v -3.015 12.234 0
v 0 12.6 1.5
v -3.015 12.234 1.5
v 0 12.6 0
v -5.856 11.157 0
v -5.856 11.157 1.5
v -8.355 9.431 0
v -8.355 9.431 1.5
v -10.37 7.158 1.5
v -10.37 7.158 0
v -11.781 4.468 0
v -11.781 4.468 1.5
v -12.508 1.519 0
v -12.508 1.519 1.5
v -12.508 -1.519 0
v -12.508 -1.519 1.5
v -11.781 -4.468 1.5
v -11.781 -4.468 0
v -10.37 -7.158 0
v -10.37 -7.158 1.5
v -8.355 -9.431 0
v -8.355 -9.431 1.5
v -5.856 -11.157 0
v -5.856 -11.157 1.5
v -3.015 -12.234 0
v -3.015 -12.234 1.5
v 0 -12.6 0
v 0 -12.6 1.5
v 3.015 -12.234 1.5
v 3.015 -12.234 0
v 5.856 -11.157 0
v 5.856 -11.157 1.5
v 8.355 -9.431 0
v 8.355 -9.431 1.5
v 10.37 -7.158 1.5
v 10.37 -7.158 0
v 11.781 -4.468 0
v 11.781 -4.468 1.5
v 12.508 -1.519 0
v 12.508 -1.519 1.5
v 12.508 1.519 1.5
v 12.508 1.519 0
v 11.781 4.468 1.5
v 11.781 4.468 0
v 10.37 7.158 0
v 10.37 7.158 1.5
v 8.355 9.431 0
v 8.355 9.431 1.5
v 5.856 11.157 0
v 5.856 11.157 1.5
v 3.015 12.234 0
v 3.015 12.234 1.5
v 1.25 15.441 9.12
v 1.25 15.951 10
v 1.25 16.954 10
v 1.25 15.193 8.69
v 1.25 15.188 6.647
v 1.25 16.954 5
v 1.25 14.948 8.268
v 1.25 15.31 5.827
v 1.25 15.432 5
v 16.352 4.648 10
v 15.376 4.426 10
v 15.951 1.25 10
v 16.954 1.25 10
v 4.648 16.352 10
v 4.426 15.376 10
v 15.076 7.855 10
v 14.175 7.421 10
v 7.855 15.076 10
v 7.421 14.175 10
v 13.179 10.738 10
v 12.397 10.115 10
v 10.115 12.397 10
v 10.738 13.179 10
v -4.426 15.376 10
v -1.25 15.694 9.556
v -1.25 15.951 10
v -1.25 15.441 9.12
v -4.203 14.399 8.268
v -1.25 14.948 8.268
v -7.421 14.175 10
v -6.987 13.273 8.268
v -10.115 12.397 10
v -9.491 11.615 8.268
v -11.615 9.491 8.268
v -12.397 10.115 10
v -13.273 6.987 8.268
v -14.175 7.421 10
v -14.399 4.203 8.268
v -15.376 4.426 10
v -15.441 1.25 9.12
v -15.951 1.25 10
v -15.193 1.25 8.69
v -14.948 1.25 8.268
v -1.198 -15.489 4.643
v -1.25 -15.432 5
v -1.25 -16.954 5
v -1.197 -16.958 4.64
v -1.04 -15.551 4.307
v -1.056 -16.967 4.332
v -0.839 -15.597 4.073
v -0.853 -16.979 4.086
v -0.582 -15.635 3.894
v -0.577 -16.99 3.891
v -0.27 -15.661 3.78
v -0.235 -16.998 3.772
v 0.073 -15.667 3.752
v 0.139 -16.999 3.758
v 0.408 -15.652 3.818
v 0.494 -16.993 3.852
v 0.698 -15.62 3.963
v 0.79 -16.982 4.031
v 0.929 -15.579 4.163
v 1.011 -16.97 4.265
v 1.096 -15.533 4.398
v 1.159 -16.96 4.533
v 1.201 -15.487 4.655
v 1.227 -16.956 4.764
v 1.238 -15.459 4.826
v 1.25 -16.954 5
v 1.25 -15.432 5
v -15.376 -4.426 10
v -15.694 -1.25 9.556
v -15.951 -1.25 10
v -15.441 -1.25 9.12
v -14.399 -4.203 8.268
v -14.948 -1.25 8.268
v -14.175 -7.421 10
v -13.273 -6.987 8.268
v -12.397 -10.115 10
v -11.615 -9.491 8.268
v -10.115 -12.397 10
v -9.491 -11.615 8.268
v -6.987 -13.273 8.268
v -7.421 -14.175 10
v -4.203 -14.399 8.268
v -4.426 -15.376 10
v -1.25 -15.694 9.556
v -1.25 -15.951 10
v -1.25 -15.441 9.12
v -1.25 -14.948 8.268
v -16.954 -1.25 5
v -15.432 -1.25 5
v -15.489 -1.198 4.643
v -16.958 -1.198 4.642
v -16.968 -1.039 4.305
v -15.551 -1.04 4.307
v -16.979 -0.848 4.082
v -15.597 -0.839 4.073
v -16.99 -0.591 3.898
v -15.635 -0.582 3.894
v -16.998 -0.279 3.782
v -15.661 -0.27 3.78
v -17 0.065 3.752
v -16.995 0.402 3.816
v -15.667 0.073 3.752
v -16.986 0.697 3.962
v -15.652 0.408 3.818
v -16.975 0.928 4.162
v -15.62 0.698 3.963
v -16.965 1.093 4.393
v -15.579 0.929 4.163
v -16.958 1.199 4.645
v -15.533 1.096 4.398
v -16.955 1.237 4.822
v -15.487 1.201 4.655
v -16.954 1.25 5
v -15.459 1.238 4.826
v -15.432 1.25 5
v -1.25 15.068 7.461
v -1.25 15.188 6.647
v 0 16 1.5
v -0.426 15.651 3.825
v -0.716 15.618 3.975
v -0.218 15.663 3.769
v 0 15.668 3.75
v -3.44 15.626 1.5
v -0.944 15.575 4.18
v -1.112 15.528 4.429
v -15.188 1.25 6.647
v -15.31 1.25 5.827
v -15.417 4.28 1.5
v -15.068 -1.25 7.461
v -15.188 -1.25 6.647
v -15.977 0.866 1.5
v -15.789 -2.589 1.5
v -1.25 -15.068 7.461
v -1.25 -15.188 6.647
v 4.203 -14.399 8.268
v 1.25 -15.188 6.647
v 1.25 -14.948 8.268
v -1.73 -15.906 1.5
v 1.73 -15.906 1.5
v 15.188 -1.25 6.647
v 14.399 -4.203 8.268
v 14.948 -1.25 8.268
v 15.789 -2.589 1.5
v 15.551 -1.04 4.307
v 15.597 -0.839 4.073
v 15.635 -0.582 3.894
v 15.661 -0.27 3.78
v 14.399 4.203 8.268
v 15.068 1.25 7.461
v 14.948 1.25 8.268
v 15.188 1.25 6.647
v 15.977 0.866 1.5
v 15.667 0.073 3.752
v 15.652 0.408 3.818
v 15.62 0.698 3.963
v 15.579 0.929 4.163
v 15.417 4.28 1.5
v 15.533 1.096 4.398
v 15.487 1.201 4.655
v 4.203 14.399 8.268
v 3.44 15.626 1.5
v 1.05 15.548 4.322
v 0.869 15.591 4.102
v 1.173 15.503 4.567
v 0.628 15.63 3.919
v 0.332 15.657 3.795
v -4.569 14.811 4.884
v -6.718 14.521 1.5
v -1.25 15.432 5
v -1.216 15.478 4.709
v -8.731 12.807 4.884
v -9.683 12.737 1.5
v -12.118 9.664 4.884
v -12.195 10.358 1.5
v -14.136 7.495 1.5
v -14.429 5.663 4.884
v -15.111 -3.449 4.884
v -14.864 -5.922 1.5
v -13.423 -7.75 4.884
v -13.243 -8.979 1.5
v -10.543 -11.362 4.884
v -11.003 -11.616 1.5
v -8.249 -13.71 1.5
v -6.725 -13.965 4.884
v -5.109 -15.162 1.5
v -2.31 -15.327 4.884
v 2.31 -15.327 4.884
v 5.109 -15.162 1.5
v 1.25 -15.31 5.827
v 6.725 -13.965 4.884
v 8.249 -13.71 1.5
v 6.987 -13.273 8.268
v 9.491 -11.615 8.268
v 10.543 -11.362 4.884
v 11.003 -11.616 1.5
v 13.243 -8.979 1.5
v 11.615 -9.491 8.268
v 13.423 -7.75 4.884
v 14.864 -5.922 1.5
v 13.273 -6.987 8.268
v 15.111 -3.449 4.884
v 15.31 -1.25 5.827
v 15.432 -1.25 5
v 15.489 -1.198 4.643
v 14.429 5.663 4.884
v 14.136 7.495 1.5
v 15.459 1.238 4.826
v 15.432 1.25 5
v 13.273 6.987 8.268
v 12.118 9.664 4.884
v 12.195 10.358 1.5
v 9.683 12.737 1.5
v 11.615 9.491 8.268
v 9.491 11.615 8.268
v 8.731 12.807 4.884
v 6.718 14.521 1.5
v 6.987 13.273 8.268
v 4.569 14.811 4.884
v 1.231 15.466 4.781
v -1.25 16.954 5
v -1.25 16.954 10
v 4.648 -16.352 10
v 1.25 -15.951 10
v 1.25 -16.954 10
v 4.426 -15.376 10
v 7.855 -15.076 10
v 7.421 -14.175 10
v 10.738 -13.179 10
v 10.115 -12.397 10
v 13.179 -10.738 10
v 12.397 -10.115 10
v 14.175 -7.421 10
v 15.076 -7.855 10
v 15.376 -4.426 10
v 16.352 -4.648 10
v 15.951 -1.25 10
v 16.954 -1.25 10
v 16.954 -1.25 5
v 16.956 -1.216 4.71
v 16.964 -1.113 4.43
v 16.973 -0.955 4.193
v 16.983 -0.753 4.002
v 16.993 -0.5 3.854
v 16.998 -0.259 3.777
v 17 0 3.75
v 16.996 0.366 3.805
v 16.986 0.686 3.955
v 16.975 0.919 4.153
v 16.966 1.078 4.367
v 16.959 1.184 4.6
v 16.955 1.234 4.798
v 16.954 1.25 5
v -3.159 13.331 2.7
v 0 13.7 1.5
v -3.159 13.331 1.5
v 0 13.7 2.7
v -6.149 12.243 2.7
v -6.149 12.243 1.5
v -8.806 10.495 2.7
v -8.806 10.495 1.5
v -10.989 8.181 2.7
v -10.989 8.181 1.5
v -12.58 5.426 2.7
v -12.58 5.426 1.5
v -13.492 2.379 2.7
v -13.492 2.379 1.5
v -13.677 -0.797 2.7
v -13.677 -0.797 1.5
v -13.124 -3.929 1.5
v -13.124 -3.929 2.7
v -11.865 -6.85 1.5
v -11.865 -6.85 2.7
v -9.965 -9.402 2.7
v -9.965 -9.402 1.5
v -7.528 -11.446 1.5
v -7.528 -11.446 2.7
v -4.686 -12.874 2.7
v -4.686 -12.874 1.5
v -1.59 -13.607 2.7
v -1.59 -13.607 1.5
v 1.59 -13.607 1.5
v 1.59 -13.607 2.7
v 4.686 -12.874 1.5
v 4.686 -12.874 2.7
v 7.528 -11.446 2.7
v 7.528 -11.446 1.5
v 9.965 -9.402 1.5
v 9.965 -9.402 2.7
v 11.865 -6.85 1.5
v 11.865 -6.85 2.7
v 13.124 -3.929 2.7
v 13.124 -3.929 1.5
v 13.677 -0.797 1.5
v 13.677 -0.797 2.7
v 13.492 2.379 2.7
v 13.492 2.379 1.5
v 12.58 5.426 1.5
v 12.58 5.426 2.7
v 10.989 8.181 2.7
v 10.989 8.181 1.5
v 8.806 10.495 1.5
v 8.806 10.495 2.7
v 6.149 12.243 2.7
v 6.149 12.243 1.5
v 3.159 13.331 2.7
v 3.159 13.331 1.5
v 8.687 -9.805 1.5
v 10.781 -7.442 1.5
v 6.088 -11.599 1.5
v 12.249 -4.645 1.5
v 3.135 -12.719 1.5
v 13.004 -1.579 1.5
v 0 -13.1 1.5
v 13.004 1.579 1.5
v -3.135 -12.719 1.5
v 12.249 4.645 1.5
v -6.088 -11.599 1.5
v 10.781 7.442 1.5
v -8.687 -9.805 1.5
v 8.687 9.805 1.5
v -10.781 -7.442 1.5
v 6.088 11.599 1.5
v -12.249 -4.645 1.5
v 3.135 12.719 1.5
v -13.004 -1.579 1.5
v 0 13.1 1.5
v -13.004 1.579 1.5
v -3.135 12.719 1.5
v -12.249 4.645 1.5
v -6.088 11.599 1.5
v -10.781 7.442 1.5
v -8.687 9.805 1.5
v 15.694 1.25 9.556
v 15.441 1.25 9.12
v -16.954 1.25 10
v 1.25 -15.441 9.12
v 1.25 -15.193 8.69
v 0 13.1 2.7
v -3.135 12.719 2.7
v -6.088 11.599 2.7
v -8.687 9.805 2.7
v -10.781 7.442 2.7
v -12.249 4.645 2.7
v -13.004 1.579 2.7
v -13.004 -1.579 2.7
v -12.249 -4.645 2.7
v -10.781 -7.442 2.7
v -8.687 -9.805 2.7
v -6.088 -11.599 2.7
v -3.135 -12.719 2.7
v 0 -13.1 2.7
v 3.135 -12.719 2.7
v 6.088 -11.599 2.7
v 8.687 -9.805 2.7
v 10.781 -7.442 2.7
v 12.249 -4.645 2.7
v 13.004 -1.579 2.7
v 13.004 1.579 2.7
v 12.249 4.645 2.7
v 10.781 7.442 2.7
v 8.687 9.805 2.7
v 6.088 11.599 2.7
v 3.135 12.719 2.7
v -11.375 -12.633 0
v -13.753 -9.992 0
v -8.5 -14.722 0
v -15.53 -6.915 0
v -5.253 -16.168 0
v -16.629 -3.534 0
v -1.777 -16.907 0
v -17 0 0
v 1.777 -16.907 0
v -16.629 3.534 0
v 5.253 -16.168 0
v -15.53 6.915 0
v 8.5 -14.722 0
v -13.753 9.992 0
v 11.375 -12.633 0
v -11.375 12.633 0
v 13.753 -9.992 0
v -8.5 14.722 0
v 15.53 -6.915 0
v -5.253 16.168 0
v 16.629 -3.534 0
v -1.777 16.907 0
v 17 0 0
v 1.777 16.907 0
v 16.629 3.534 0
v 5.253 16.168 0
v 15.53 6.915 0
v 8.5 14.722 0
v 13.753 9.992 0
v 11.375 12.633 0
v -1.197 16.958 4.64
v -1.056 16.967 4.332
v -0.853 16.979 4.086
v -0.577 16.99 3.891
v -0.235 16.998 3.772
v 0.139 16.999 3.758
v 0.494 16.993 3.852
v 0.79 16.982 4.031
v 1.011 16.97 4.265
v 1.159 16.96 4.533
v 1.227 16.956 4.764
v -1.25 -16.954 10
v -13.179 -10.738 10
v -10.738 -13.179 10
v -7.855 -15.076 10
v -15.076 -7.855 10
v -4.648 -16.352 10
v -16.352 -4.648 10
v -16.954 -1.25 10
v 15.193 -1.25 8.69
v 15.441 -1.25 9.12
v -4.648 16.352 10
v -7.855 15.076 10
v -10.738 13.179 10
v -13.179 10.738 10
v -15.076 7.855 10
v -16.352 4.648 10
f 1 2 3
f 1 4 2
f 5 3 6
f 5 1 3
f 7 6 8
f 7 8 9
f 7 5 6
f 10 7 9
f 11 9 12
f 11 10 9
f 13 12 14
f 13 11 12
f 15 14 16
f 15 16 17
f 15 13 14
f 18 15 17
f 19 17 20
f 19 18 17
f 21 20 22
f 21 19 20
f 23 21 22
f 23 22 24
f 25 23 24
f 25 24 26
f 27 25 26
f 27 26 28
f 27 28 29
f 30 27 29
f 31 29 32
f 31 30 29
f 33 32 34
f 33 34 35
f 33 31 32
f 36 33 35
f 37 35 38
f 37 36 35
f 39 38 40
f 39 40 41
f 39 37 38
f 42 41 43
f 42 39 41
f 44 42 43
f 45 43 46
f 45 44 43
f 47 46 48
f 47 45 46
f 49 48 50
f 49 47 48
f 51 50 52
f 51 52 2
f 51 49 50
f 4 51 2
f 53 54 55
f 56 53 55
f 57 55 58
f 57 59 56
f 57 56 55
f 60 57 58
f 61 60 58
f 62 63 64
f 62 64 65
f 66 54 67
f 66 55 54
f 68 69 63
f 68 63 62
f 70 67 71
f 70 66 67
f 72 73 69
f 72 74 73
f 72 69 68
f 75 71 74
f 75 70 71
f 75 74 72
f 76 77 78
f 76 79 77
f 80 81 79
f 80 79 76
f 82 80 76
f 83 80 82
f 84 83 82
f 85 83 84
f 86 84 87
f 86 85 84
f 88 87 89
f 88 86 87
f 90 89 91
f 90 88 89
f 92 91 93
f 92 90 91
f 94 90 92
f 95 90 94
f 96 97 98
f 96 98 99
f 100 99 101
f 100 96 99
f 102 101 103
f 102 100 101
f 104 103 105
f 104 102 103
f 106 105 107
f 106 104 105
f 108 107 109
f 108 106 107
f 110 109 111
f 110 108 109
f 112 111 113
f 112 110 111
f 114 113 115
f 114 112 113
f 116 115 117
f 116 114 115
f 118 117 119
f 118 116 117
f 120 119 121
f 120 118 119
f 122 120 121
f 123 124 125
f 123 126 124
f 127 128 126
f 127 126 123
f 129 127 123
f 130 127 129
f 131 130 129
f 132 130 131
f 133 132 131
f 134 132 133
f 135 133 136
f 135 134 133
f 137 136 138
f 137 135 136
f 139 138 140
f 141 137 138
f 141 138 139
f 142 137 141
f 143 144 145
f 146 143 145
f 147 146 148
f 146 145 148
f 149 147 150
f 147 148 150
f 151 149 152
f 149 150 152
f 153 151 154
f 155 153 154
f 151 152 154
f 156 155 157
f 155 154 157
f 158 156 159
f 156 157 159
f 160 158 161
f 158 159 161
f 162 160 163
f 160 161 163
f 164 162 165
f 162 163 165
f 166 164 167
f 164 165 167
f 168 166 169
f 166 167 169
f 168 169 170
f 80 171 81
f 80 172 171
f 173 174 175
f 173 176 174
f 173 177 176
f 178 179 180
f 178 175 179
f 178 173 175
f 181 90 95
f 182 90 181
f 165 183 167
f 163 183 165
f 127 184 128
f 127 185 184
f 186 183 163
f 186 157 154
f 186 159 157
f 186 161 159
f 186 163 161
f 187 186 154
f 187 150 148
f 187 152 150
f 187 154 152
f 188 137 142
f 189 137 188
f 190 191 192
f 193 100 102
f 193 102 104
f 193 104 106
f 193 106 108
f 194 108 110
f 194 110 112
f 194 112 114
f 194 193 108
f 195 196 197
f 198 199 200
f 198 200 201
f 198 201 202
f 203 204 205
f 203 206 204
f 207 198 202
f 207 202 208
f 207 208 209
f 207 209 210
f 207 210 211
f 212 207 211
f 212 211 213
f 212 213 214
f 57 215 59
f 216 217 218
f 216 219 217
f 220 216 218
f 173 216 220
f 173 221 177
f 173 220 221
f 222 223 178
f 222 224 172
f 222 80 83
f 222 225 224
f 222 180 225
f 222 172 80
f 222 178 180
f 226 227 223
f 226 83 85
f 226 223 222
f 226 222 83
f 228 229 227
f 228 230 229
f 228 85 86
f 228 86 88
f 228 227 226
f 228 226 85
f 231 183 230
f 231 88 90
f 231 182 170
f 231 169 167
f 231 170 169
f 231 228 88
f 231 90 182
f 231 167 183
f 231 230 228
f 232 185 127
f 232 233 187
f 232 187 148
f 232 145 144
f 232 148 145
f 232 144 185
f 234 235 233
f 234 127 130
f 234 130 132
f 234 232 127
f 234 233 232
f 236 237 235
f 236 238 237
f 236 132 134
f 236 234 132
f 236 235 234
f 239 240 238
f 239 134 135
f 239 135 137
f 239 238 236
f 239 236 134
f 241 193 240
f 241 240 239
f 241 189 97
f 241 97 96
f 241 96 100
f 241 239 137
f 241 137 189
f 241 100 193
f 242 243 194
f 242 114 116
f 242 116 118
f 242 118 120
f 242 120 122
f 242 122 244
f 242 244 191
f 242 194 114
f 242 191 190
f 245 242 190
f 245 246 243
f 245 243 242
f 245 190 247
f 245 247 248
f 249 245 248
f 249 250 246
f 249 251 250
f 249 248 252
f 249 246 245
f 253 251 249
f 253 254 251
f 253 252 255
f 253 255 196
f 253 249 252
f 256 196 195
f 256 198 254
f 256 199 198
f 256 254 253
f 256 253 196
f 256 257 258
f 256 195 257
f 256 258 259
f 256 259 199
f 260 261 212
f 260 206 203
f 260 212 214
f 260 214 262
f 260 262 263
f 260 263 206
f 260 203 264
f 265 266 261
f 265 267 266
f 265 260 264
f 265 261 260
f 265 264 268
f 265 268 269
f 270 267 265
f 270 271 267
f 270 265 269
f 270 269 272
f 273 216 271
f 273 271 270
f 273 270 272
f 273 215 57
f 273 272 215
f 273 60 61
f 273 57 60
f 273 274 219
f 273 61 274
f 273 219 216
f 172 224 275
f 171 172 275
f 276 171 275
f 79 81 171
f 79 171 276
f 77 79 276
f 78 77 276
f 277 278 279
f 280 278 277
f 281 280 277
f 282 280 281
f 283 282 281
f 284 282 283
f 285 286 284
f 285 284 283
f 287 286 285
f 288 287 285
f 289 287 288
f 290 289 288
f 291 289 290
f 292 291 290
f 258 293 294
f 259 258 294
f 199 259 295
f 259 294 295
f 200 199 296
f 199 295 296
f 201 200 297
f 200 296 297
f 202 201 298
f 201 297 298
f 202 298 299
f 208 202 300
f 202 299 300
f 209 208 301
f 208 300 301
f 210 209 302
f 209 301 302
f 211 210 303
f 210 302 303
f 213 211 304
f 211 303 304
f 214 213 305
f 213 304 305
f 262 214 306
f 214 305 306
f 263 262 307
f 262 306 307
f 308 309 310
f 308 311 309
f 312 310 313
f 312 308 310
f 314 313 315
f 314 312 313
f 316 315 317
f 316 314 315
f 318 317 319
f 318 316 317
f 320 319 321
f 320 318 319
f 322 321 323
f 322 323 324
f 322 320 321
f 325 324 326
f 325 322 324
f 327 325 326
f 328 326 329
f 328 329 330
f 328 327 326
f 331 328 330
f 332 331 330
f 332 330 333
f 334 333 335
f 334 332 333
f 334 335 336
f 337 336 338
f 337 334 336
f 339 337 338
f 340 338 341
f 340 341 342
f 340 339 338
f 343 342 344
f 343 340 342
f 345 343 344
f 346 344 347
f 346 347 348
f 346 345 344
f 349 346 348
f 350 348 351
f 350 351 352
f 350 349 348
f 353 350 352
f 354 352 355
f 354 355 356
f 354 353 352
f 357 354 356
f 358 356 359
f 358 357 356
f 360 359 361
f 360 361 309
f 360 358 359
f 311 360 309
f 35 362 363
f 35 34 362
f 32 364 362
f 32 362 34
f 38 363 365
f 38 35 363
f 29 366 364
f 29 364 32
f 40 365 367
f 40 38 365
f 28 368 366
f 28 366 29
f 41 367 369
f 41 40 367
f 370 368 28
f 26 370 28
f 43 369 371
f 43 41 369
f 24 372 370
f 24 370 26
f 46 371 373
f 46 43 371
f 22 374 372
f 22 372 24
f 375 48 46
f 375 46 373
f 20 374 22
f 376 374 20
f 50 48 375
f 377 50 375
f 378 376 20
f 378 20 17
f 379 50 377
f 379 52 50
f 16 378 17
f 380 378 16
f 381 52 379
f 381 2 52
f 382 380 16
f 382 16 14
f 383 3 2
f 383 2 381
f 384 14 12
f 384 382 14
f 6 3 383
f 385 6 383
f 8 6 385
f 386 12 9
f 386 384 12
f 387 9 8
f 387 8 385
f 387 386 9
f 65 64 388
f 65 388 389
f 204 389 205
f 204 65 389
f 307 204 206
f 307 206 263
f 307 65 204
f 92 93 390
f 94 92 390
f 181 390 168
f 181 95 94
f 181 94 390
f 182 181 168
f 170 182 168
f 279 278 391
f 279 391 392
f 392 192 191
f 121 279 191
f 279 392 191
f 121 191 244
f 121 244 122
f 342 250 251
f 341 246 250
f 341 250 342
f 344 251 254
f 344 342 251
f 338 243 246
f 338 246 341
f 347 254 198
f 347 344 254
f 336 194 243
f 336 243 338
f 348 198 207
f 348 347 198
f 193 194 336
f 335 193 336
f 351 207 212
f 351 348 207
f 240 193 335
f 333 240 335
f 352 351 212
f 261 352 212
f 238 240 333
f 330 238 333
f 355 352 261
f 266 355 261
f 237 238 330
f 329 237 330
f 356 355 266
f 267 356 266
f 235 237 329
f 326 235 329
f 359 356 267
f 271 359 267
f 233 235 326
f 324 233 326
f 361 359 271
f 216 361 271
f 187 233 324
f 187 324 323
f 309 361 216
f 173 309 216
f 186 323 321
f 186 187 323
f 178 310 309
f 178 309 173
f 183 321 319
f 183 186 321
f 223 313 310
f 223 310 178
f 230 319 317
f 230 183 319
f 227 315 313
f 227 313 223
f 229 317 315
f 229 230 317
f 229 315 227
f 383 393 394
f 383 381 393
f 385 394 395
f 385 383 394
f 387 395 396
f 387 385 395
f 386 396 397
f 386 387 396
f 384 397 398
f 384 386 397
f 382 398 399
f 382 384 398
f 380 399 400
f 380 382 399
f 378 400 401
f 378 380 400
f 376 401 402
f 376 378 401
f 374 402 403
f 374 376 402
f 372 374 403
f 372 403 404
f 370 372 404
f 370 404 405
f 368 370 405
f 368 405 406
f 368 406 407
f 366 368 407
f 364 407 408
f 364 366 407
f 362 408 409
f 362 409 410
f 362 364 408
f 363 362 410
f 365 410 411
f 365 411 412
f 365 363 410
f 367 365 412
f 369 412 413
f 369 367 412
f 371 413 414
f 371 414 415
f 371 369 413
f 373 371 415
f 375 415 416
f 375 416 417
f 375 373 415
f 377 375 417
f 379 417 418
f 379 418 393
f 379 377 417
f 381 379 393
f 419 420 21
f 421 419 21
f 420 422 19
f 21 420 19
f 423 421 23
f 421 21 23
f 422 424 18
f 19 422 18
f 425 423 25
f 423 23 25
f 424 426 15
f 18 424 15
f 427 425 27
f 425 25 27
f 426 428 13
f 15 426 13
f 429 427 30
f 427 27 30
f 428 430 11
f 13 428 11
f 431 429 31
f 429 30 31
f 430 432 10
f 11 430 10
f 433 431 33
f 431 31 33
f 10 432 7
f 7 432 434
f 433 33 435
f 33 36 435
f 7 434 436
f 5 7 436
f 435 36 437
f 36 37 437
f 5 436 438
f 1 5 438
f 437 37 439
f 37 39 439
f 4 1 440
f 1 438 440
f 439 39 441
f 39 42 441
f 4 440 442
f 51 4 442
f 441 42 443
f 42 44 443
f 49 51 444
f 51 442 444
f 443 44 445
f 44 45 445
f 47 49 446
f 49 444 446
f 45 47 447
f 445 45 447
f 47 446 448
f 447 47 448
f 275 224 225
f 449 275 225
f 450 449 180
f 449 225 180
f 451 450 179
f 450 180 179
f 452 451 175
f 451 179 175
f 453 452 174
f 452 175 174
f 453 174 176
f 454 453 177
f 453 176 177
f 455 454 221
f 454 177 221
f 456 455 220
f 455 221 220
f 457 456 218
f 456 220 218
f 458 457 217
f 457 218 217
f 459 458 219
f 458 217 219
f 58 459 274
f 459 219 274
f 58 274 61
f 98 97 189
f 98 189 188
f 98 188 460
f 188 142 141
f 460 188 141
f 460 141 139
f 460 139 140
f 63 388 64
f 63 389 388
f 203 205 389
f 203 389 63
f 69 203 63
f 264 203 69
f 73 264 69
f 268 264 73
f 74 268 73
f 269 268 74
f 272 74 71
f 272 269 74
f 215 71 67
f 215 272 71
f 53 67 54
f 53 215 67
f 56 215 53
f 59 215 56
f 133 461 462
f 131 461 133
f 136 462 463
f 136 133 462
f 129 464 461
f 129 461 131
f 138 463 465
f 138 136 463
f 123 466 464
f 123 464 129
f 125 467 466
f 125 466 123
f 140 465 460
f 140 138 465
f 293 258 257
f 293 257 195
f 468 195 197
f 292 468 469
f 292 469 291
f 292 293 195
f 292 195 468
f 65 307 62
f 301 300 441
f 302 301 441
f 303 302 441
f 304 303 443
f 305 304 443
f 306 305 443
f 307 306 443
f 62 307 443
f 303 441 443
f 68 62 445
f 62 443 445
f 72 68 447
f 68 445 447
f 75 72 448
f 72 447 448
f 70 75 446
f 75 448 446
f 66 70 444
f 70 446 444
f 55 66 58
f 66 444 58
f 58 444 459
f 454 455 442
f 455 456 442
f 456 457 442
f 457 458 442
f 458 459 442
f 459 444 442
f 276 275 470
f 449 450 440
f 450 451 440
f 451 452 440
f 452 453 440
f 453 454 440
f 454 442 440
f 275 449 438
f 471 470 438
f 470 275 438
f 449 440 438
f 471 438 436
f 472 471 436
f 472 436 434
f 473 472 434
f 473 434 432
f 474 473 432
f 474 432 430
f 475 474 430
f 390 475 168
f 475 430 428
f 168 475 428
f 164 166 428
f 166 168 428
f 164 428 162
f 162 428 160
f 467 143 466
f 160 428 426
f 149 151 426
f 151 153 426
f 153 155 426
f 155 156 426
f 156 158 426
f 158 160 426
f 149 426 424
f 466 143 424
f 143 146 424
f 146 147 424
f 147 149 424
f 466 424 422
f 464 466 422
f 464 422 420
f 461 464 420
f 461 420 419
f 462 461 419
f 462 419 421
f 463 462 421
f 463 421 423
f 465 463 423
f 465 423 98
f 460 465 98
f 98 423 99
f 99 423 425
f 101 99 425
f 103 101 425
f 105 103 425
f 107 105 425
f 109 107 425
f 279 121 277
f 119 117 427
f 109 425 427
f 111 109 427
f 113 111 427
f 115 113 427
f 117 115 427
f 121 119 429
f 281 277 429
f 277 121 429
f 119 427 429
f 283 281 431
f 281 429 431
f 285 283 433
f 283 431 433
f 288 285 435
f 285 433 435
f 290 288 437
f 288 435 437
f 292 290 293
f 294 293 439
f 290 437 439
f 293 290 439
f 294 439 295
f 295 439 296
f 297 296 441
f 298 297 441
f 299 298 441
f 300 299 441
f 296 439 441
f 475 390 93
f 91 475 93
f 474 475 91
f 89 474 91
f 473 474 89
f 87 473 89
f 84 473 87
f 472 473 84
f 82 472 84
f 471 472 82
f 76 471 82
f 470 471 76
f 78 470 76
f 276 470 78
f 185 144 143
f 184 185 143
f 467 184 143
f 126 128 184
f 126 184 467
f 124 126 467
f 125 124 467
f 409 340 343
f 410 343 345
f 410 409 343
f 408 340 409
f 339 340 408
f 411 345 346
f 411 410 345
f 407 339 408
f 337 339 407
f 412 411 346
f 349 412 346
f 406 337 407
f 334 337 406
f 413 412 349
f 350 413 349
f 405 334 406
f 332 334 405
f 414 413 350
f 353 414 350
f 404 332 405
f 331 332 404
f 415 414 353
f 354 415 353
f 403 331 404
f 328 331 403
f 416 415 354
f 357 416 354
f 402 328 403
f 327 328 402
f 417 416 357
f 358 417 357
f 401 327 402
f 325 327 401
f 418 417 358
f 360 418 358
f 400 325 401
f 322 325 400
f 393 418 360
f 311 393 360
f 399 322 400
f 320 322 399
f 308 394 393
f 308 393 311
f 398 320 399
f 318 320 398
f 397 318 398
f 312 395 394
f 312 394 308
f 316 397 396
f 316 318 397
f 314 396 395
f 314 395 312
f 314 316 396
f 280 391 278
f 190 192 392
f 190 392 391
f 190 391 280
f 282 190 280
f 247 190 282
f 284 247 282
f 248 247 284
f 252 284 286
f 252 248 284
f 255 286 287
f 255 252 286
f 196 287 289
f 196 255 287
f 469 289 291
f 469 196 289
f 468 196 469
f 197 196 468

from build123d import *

# Parameters (mm, degrees)
SKETCH_R           = 17
PAD_DEPTH          = 10
POCKET_DEPTH       = 115.225233
POCKET_DEPTH_BACK  = 115.225233
POLARPATTERN_COUNT = 2
POLARPATTERN_ANGLE = 90


with BuildPart() as part:
    # Sketch → Pad (new body)
    with BuildSketch(Plane.XY):
        Circle(SKETCH_R)
    extrude(amount=PAD_DEPTH)

    # Sketch001 → Groove (revolve, cut)
    with BuildSketch(Plane.YZ):
        Polygon((0, 0), (0, 10), (16, 10), (15, 8.267949), (16, 1.5), (13.7, 1.5), (13.7, 2.7), (13.1, 2.7), (13.1, 1.5), (12.6, 1.5), (12.6, 0), align=None)
    revolve(axis=Axis((0, 0, 0), (0, 0, 1)), mode=Mode.SUBTRACT)

    # Sketch002 → Pocket (cut, two sides)
    with BuildSketch(Plane.XZ) as pocket_sk:
        with BuildLine():
            Line((-1.25, 10), (1.25, 10))
            Line((1.25, 10), (1.25, 5))
            ThreePointArc((-1.25, 5), (0, 3.75), (1.25, 5))
            Line((-1.25, 5), (-1.25, 10))
        make_face()
    pocket = extrude(amount=-POCKET_DEPTH, mode=Mode.SUBTRACT) + extrude(pocket_sk.sketch, amount=POCKET_DEPTH_BACK, mode=Mode.SUBTRACT)

    # PolarPattern: Pocket ×2 about axis
    polarpattern_axis = Axis((0, 0, 0), (0, 0, 1))
    for i in range(1, POLARPATTERN_COUNT):
        add(pocket.rotate(polarpattern_axis, i * POLARPATTERN_ANGLE / (POLARPATTERN_COUNT - 1)), mode=Mode.SUBTRACT)


solid = part.part
